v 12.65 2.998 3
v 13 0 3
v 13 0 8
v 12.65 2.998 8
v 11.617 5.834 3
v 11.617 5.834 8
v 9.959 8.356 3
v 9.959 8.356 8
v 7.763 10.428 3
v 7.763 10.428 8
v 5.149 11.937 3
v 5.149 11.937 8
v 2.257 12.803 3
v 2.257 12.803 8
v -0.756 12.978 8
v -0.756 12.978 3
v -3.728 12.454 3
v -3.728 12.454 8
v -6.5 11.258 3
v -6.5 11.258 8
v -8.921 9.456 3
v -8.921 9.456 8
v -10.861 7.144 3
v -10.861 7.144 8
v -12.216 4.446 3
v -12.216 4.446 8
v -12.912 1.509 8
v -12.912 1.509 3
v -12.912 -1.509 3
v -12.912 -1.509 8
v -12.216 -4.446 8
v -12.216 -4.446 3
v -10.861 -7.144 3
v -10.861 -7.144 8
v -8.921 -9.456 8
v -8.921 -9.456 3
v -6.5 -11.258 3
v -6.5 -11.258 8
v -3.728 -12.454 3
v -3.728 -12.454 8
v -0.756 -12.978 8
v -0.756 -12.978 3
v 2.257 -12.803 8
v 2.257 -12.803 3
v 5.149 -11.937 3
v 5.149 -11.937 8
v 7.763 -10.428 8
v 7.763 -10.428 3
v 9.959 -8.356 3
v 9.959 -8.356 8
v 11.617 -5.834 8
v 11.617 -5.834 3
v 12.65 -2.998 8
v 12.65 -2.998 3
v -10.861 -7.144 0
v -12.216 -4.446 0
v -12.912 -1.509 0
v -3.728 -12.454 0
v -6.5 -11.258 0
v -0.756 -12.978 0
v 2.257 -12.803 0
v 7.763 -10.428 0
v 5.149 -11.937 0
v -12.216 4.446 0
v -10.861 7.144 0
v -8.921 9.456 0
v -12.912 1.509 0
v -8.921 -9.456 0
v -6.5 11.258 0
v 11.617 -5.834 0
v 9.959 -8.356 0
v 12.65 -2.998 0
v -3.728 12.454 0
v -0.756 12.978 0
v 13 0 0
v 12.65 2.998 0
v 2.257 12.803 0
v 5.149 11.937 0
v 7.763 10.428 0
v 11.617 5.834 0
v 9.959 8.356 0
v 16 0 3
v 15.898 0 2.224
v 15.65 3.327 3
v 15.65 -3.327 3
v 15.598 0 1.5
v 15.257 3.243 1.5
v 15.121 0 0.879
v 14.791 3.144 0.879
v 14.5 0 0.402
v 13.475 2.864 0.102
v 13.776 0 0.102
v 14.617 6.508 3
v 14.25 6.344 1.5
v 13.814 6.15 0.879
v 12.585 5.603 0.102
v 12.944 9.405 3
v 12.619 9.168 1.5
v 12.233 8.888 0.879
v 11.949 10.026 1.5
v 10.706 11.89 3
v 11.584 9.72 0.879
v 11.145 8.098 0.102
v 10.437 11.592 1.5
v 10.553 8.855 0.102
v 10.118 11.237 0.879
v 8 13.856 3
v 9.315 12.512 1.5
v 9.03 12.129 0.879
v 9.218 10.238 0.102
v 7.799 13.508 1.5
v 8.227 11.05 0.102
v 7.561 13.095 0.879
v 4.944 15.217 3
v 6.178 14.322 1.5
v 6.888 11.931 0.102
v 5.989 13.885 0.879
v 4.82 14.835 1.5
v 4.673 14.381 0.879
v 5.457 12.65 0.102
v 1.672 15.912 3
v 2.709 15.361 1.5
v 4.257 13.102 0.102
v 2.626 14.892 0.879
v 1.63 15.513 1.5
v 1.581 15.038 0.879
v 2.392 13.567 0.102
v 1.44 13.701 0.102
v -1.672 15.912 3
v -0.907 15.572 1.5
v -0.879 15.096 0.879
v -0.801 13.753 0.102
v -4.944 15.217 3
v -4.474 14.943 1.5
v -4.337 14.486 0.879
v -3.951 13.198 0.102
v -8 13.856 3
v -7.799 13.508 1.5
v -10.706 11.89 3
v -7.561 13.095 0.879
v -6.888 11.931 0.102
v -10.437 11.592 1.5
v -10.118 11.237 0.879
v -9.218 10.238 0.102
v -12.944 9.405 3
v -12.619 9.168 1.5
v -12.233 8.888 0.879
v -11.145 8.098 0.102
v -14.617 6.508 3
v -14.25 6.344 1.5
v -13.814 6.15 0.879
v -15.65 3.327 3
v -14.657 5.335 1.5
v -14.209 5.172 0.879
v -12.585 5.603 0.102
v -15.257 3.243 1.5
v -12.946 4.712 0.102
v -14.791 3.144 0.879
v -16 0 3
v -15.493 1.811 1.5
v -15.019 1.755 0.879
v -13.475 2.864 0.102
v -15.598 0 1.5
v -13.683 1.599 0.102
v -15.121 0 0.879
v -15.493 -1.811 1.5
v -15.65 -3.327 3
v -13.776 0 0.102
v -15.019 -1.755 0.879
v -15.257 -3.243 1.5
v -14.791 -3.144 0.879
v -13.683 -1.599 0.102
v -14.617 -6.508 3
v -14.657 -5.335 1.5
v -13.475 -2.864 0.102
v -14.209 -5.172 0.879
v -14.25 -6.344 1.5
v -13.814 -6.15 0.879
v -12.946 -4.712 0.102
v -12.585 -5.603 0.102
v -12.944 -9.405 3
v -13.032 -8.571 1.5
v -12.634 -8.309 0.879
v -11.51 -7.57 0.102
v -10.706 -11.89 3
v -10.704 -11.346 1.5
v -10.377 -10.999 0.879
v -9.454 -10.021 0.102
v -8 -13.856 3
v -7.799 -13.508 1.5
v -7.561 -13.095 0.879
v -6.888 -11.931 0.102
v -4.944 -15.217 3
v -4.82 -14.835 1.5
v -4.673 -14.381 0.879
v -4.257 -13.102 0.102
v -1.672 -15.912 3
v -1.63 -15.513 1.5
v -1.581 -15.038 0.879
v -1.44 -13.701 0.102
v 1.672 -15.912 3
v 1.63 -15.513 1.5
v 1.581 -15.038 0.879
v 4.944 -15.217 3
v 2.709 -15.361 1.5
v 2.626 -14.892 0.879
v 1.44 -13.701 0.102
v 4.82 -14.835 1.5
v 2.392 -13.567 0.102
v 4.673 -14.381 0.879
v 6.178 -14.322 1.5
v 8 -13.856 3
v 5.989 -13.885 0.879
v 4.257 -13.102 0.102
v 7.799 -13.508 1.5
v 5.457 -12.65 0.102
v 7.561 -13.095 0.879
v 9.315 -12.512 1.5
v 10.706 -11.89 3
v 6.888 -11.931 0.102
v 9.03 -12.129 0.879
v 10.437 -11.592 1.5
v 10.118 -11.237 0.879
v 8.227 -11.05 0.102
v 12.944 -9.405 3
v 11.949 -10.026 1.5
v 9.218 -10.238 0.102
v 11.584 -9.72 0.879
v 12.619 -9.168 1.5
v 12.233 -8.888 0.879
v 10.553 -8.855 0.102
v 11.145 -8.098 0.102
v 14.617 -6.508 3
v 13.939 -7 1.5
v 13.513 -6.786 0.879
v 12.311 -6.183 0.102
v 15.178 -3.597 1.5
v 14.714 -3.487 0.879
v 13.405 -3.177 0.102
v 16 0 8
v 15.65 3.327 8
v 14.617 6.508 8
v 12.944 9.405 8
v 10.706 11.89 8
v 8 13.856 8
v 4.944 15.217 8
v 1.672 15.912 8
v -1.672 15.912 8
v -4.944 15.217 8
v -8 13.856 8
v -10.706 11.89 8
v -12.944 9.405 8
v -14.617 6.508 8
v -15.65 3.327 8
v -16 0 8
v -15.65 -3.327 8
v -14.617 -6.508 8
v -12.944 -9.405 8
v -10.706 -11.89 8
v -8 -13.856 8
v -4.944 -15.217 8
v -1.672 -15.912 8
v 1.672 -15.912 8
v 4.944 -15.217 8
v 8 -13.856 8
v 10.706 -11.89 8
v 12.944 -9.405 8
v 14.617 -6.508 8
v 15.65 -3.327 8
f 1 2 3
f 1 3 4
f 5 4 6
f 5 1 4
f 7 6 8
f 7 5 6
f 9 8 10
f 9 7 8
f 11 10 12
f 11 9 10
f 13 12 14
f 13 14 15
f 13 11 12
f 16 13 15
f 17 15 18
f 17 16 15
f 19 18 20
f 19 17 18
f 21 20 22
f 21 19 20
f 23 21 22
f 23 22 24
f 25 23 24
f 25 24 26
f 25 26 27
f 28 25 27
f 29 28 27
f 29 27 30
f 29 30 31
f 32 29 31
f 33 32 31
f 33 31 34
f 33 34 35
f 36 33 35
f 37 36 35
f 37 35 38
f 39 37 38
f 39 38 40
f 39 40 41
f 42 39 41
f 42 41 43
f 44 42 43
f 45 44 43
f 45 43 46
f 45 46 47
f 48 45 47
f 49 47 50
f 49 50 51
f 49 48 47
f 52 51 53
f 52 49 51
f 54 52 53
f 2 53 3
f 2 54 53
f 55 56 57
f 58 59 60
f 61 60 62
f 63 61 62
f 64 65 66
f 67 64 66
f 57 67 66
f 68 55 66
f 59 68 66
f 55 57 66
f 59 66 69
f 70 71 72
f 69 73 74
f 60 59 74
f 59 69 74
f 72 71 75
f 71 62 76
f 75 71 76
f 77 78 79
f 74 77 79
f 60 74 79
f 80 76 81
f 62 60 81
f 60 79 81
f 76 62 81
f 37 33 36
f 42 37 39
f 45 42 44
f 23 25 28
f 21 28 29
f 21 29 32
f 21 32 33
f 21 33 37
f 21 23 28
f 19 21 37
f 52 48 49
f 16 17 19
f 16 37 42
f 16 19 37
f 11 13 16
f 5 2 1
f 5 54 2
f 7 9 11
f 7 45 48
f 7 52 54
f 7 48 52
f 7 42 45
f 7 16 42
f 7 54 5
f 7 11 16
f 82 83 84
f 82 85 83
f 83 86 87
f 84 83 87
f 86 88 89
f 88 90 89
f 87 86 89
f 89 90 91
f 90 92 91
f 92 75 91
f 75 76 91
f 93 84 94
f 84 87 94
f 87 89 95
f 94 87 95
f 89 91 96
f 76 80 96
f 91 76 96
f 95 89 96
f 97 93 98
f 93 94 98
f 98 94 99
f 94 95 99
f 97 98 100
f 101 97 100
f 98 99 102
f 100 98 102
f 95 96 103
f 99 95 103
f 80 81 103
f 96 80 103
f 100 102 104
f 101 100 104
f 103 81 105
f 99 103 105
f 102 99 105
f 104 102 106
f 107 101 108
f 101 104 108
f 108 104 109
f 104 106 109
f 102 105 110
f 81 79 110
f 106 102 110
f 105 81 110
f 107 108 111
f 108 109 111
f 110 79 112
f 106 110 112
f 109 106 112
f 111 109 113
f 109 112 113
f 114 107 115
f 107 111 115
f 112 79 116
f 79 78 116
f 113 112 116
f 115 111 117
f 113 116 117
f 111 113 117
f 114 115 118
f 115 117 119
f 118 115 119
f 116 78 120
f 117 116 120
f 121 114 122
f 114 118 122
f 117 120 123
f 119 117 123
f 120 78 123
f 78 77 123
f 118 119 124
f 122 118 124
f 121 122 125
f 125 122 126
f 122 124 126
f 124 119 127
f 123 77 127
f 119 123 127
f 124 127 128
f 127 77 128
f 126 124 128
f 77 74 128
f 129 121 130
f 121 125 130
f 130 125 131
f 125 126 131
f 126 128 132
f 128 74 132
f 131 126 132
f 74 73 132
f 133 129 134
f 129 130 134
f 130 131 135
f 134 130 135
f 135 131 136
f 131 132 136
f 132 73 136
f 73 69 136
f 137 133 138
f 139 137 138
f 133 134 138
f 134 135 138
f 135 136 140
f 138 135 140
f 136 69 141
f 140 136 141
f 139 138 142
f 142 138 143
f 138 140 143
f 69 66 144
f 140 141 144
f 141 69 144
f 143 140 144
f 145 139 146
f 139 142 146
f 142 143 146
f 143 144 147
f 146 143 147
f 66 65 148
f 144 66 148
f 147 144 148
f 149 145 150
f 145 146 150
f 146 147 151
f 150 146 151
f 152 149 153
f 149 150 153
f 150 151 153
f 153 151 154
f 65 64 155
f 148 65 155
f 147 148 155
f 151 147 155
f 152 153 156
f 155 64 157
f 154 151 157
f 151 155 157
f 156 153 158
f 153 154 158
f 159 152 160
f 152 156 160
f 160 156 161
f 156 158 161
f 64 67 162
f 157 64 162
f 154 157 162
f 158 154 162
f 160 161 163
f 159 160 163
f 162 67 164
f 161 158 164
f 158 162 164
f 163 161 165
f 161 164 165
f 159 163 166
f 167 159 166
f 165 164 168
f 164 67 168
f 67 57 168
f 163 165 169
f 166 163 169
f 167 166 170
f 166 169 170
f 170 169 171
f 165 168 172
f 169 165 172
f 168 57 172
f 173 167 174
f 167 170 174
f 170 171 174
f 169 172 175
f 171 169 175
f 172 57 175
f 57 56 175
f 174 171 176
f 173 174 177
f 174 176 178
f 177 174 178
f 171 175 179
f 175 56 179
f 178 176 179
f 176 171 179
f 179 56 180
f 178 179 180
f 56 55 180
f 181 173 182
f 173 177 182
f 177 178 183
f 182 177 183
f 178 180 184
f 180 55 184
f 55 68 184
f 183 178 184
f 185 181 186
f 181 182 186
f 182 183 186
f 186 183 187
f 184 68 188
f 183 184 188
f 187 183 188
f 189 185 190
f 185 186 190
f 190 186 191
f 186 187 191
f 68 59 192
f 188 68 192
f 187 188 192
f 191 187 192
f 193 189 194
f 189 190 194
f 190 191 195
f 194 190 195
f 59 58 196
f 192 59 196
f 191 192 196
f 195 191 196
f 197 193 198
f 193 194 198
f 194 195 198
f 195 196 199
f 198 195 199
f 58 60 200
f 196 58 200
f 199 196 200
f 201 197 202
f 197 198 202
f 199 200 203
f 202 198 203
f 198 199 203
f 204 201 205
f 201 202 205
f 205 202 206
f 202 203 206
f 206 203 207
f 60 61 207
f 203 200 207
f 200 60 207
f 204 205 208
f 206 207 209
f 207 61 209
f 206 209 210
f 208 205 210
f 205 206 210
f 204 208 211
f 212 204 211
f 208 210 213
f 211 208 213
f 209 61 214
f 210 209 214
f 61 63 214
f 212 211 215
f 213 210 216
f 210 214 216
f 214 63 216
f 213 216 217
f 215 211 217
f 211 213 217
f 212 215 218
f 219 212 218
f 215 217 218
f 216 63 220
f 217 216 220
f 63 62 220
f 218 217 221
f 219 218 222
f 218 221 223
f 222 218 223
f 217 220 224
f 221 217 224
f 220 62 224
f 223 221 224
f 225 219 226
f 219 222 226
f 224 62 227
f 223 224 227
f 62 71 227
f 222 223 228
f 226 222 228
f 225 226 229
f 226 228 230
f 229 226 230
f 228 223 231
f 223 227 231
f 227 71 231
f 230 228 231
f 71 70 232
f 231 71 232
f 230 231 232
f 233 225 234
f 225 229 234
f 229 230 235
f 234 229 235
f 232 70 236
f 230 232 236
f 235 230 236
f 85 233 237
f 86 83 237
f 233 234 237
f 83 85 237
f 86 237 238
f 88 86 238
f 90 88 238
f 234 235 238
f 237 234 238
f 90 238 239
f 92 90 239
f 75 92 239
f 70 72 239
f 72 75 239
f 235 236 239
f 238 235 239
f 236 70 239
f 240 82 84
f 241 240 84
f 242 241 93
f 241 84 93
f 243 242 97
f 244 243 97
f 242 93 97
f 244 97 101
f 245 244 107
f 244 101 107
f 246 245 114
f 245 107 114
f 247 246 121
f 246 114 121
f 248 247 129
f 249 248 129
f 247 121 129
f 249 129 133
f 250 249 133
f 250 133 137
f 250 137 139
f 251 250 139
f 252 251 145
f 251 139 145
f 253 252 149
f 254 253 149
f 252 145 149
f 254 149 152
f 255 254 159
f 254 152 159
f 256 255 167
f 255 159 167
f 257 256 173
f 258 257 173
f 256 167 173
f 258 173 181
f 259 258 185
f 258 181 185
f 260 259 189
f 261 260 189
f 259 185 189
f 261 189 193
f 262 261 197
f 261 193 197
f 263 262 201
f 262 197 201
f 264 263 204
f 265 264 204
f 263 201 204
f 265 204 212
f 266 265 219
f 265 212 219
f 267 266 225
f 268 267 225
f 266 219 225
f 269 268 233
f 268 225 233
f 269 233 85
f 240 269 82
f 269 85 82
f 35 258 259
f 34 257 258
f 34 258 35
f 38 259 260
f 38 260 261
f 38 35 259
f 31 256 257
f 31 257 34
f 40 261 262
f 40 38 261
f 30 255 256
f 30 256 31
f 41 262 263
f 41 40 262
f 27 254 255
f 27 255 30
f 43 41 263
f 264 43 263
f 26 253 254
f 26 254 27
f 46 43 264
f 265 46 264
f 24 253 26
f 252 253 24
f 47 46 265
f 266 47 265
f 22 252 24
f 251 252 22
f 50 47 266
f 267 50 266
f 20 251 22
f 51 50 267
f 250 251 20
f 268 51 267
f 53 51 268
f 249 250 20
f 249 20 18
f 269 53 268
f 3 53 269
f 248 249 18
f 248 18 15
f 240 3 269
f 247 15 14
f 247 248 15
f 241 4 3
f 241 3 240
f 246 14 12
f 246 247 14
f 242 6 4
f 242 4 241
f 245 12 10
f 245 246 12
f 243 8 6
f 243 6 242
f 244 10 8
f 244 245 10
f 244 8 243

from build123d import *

# Parameters (mm, degrees)
F0_R     = 13
F1_DEPTH = 3
F0_R_2   = 16
F2_DEPTH = 8
F3_R     = 3


with BuildPart() as f1:
    # F0 (on Top) → F1 (new body)
    with BuildSketch(Plane.XY):
        Circle(F0_R)
    extrude(amount=F1_DEPTH)

    # F0 (on Top) → F2 (join)
    with BuildSketch(Plane.XY):
        Circle(F0_R_2)
        Circle(F0_R, mode=Mode.SUBTRACT)
    extrude(amount=F2_DEPTH)

    # F3
    f3_edges = [f1.edges().sort_by_distance(p)[0] for p in [
        (-16, 0, 0),
    ]]
    fillet(f3_edges, radius=F3_R)


solid = f1.part
